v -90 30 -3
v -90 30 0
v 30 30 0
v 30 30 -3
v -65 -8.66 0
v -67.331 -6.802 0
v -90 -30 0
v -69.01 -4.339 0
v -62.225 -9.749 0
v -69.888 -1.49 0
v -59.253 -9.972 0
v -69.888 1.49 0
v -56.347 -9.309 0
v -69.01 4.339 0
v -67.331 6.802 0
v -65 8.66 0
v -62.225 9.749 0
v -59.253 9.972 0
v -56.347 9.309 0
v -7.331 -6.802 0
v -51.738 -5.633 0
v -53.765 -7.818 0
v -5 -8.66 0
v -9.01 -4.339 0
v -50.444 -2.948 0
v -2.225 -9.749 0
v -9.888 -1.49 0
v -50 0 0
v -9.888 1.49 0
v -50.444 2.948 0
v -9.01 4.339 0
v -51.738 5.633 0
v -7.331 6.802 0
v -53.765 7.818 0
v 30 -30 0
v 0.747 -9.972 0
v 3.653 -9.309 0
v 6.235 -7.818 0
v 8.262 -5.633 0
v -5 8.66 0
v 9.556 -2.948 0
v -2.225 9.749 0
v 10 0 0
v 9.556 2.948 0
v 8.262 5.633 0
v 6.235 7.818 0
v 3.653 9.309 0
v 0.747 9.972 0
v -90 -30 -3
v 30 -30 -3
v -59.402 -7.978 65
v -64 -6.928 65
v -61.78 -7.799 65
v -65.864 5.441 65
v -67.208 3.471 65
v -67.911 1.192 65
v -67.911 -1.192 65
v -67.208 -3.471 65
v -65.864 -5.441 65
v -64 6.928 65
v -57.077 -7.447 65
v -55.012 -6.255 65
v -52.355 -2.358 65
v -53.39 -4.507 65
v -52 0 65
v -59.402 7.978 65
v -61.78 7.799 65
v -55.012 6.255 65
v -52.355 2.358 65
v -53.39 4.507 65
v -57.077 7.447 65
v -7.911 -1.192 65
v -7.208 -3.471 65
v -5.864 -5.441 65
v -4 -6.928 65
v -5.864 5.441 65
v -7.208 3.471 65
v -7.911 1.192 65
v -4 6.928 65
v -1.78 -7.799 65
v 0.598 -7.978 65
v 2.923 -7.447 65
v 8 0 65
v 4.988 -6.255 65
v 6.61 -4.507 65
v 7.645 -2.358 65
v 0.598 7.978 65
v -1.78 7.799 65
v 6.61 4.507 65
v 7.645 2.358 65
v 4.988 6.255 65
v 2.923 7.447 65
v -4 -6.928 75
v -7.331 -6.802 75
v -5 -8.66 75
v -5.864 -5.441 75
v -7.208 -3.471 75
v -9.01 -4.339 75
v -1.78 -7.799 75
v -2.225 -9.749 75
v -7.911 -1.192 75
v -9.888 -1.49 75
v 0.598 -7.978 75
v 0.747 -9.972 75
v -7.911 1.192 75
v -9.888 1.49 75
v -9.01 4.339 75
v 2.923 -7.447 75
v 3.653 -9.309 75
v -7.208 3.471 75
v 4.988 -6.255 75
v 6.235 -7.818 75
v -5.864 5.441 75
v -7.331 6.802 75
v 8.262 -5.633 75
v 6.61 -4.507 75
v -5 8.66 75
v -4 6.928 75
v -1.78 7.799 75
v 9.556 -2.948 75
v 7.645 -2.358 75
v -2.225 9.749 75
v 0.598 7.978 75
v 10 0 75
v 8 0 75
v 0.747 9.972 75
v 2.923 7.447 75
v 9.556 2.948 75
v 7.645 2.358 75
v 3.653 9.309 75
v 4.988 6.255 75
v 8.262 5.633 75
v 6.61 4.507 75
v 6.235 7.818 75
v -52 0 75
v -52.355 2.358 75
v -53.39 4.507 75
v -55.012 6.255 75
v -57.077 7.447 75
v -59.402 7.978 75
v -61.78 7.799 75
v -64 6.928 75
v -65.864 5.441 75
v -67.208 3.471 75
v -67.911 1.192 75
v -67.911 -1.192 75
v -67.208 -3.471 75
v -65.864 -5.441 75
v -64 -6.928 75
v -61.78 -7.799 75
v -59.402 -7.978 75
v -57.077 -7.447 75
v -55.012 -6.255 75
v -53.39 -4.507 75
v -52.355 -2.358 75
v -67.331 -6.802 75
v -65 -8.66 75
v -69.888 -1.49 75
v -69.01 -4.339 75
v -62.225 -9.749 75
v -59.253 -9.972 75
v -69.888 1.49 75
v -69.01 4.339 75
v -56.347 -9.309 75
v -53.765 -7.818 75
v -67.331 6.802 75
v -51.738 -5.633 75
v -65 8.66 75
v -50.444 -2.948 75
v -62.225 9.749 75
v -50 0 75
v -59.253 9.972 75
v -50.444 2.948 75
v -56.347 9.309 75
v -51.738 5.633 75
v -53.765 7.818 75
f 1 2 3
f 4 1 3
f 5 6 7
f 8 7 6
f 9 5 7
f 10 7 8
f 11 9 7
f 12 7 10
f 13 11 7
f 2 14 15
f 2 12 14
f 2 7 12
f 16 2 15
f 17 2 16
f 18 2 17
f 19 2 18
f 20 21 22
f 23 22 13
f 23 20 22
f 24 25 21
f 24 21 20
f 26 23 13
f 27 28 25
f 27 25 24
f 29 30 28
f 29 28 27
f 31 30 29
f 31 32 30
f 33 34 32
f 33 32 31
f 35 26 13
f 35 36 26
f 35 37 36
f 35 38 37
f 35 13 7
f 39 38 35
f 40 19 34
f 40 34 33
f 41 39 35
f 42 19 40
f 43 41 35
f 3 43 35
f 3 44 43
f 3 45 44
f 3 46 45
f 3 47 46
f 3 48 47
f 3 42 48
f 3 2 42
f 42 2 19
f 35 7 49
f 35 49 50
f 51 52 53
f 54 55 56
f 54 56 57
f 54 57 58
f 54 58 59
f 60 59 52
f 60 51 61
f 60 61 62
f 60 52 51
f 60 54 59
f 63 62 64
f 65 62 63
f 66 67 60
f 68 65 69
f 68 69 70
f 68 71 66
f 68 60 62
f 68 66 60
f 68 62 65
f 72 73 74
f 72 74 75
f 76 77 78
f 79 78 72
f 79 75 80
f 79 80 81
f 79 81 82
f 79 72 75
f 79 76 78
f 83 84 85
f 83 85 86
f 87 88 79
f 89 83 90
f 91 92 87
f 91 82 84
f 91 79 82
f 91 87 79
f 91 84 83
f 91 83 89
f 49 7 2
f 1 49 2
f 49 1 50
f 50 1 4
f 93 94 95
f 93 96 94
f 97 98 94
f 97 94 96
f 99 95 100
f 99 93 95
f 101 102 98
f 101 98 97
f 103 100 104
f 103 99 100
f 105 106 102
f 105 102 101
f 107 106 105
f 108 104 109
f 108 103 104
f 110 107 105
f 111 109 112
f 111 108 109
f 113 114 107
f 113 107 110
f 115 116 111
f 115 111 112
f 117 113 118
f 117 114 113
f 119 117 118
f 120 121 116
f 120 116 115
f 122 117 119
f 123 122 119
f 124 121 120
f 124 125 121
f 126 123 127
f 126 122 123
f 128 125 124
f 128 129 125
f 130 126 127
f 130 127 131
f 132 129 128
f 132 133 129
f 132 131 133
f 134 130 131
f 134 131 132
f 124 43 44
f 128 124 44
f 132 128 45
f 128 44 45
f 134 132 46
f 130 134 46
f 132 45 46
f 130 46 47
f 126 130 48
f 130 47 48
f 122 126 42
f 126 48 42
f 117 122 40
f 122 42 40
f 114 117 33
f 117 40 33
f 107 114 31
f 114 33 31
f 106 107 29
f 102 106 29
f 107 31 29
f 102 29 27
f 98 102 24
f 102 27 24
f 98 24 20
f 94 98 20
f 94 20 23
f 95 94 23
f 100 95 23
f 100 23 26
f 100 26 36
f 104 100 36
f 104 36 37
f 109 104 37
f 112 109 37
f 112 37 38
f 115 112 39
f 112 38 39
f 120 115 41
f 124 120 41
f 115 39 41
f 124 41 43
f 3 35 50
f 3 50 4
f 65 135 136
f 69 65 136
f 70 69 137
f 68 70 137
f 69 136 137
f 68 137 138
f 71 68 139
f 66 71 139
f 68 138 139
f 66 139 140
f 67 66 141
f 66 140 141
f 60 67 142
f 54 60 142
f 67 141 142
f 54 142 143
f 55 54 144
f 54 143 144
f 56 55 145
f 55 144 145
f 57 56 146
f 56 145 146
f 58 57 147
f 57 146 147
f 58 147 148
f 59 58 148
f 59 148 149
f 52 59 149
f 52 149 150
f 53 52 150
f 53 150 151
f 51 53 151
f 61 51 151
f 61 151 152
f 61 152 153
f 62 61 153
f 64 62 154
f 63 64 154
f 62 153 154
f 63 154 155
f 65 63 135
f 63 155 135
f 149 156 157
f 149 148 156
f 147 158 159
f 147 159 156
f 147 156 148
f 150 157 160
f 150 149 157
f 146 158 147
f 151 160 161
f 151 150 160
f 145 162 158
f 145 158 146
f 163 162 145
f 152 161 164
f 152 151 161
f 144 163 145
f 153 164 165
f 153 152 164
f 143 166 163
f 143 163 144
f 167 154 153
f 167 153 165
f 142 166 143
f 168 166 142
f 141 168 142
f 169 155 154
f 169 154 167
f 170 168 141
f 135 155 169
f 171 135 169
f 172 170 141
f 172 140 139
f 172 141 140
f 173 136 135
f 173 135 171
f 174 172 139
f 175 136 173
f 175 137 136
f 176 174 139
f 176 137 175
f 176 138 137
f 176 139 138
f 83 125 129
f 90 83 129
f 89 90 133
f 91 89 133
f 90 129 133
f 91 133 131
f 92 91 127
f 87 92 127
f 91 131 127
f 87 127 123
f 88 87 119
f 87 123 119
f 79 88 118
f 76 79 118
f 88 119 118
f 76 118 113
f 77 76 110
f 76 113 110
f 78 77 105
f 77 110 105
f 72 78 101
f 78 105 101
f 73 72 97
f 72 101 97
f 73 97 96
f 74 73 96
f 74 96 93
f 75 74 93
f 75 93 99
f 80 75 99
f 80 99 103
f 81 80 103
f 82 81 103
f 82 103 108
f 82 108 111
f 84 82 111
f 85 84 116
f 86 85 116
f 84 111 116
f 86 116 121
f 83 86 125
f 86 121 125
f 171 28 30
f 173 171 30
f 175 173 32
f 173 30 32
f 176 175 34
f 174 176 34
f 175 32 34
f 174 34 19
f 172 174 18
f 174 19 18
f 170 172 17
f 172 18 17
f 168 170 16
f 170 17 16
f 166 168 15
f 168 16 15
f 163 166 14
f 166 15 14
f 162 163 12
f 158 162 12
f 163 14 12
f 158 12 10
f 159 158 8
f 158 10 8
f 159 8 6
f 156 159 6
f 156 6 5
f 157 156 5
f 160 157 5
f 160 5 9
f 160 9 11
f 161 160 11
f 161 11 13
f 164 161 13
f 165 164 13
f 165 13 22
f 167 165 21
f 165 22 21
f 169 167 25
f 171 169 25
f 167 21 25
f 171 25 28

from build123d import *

# Parameters (mm, degrees)
F0_W     = 120
F0_H     = 60
F0_R     = 10
F1_DEPTH = 3
F2_DEPTH = 75
F3_R     = 8
F4_DEPTH = 10


with BuildPart() as f1:
    # F0 (on Top) → F1 (new body)
    with BuildSketch(Plane.XY):
        with Locations((-30, 0)):
            Rectangle(F0_W, F0_H)
        with Locations((-60, 0)):
            Circle(F0_R, mode=Mode.SUBTRACT)
        Circle(F0_R, mode=Mode.SUBTRACT)
        with Locations((-60, 0)):
            Circle(F0_R)
        Circle(F0_R)
    extrude(amount=-F1_DEPTH)

    # F0 (on Top) → F2 (join)
    with BuildSketch(Plane.XY):
        with Locations((-60, 0)):
            Circle(F0_R)
        Circle(F0_R)
    extrude(amount=F2_DEPTH)

    # F3 (on face) → F4 (cut)
    with BuildSketch(Plane.XY.offset(75)):
        with Locations((-60, 0)):
            Circle(F3_R)
        Circle(F3_R)
    extrude(amount=-F4_DEPTH, mode=Mode.SUBTRACT)


solid = f1.part
